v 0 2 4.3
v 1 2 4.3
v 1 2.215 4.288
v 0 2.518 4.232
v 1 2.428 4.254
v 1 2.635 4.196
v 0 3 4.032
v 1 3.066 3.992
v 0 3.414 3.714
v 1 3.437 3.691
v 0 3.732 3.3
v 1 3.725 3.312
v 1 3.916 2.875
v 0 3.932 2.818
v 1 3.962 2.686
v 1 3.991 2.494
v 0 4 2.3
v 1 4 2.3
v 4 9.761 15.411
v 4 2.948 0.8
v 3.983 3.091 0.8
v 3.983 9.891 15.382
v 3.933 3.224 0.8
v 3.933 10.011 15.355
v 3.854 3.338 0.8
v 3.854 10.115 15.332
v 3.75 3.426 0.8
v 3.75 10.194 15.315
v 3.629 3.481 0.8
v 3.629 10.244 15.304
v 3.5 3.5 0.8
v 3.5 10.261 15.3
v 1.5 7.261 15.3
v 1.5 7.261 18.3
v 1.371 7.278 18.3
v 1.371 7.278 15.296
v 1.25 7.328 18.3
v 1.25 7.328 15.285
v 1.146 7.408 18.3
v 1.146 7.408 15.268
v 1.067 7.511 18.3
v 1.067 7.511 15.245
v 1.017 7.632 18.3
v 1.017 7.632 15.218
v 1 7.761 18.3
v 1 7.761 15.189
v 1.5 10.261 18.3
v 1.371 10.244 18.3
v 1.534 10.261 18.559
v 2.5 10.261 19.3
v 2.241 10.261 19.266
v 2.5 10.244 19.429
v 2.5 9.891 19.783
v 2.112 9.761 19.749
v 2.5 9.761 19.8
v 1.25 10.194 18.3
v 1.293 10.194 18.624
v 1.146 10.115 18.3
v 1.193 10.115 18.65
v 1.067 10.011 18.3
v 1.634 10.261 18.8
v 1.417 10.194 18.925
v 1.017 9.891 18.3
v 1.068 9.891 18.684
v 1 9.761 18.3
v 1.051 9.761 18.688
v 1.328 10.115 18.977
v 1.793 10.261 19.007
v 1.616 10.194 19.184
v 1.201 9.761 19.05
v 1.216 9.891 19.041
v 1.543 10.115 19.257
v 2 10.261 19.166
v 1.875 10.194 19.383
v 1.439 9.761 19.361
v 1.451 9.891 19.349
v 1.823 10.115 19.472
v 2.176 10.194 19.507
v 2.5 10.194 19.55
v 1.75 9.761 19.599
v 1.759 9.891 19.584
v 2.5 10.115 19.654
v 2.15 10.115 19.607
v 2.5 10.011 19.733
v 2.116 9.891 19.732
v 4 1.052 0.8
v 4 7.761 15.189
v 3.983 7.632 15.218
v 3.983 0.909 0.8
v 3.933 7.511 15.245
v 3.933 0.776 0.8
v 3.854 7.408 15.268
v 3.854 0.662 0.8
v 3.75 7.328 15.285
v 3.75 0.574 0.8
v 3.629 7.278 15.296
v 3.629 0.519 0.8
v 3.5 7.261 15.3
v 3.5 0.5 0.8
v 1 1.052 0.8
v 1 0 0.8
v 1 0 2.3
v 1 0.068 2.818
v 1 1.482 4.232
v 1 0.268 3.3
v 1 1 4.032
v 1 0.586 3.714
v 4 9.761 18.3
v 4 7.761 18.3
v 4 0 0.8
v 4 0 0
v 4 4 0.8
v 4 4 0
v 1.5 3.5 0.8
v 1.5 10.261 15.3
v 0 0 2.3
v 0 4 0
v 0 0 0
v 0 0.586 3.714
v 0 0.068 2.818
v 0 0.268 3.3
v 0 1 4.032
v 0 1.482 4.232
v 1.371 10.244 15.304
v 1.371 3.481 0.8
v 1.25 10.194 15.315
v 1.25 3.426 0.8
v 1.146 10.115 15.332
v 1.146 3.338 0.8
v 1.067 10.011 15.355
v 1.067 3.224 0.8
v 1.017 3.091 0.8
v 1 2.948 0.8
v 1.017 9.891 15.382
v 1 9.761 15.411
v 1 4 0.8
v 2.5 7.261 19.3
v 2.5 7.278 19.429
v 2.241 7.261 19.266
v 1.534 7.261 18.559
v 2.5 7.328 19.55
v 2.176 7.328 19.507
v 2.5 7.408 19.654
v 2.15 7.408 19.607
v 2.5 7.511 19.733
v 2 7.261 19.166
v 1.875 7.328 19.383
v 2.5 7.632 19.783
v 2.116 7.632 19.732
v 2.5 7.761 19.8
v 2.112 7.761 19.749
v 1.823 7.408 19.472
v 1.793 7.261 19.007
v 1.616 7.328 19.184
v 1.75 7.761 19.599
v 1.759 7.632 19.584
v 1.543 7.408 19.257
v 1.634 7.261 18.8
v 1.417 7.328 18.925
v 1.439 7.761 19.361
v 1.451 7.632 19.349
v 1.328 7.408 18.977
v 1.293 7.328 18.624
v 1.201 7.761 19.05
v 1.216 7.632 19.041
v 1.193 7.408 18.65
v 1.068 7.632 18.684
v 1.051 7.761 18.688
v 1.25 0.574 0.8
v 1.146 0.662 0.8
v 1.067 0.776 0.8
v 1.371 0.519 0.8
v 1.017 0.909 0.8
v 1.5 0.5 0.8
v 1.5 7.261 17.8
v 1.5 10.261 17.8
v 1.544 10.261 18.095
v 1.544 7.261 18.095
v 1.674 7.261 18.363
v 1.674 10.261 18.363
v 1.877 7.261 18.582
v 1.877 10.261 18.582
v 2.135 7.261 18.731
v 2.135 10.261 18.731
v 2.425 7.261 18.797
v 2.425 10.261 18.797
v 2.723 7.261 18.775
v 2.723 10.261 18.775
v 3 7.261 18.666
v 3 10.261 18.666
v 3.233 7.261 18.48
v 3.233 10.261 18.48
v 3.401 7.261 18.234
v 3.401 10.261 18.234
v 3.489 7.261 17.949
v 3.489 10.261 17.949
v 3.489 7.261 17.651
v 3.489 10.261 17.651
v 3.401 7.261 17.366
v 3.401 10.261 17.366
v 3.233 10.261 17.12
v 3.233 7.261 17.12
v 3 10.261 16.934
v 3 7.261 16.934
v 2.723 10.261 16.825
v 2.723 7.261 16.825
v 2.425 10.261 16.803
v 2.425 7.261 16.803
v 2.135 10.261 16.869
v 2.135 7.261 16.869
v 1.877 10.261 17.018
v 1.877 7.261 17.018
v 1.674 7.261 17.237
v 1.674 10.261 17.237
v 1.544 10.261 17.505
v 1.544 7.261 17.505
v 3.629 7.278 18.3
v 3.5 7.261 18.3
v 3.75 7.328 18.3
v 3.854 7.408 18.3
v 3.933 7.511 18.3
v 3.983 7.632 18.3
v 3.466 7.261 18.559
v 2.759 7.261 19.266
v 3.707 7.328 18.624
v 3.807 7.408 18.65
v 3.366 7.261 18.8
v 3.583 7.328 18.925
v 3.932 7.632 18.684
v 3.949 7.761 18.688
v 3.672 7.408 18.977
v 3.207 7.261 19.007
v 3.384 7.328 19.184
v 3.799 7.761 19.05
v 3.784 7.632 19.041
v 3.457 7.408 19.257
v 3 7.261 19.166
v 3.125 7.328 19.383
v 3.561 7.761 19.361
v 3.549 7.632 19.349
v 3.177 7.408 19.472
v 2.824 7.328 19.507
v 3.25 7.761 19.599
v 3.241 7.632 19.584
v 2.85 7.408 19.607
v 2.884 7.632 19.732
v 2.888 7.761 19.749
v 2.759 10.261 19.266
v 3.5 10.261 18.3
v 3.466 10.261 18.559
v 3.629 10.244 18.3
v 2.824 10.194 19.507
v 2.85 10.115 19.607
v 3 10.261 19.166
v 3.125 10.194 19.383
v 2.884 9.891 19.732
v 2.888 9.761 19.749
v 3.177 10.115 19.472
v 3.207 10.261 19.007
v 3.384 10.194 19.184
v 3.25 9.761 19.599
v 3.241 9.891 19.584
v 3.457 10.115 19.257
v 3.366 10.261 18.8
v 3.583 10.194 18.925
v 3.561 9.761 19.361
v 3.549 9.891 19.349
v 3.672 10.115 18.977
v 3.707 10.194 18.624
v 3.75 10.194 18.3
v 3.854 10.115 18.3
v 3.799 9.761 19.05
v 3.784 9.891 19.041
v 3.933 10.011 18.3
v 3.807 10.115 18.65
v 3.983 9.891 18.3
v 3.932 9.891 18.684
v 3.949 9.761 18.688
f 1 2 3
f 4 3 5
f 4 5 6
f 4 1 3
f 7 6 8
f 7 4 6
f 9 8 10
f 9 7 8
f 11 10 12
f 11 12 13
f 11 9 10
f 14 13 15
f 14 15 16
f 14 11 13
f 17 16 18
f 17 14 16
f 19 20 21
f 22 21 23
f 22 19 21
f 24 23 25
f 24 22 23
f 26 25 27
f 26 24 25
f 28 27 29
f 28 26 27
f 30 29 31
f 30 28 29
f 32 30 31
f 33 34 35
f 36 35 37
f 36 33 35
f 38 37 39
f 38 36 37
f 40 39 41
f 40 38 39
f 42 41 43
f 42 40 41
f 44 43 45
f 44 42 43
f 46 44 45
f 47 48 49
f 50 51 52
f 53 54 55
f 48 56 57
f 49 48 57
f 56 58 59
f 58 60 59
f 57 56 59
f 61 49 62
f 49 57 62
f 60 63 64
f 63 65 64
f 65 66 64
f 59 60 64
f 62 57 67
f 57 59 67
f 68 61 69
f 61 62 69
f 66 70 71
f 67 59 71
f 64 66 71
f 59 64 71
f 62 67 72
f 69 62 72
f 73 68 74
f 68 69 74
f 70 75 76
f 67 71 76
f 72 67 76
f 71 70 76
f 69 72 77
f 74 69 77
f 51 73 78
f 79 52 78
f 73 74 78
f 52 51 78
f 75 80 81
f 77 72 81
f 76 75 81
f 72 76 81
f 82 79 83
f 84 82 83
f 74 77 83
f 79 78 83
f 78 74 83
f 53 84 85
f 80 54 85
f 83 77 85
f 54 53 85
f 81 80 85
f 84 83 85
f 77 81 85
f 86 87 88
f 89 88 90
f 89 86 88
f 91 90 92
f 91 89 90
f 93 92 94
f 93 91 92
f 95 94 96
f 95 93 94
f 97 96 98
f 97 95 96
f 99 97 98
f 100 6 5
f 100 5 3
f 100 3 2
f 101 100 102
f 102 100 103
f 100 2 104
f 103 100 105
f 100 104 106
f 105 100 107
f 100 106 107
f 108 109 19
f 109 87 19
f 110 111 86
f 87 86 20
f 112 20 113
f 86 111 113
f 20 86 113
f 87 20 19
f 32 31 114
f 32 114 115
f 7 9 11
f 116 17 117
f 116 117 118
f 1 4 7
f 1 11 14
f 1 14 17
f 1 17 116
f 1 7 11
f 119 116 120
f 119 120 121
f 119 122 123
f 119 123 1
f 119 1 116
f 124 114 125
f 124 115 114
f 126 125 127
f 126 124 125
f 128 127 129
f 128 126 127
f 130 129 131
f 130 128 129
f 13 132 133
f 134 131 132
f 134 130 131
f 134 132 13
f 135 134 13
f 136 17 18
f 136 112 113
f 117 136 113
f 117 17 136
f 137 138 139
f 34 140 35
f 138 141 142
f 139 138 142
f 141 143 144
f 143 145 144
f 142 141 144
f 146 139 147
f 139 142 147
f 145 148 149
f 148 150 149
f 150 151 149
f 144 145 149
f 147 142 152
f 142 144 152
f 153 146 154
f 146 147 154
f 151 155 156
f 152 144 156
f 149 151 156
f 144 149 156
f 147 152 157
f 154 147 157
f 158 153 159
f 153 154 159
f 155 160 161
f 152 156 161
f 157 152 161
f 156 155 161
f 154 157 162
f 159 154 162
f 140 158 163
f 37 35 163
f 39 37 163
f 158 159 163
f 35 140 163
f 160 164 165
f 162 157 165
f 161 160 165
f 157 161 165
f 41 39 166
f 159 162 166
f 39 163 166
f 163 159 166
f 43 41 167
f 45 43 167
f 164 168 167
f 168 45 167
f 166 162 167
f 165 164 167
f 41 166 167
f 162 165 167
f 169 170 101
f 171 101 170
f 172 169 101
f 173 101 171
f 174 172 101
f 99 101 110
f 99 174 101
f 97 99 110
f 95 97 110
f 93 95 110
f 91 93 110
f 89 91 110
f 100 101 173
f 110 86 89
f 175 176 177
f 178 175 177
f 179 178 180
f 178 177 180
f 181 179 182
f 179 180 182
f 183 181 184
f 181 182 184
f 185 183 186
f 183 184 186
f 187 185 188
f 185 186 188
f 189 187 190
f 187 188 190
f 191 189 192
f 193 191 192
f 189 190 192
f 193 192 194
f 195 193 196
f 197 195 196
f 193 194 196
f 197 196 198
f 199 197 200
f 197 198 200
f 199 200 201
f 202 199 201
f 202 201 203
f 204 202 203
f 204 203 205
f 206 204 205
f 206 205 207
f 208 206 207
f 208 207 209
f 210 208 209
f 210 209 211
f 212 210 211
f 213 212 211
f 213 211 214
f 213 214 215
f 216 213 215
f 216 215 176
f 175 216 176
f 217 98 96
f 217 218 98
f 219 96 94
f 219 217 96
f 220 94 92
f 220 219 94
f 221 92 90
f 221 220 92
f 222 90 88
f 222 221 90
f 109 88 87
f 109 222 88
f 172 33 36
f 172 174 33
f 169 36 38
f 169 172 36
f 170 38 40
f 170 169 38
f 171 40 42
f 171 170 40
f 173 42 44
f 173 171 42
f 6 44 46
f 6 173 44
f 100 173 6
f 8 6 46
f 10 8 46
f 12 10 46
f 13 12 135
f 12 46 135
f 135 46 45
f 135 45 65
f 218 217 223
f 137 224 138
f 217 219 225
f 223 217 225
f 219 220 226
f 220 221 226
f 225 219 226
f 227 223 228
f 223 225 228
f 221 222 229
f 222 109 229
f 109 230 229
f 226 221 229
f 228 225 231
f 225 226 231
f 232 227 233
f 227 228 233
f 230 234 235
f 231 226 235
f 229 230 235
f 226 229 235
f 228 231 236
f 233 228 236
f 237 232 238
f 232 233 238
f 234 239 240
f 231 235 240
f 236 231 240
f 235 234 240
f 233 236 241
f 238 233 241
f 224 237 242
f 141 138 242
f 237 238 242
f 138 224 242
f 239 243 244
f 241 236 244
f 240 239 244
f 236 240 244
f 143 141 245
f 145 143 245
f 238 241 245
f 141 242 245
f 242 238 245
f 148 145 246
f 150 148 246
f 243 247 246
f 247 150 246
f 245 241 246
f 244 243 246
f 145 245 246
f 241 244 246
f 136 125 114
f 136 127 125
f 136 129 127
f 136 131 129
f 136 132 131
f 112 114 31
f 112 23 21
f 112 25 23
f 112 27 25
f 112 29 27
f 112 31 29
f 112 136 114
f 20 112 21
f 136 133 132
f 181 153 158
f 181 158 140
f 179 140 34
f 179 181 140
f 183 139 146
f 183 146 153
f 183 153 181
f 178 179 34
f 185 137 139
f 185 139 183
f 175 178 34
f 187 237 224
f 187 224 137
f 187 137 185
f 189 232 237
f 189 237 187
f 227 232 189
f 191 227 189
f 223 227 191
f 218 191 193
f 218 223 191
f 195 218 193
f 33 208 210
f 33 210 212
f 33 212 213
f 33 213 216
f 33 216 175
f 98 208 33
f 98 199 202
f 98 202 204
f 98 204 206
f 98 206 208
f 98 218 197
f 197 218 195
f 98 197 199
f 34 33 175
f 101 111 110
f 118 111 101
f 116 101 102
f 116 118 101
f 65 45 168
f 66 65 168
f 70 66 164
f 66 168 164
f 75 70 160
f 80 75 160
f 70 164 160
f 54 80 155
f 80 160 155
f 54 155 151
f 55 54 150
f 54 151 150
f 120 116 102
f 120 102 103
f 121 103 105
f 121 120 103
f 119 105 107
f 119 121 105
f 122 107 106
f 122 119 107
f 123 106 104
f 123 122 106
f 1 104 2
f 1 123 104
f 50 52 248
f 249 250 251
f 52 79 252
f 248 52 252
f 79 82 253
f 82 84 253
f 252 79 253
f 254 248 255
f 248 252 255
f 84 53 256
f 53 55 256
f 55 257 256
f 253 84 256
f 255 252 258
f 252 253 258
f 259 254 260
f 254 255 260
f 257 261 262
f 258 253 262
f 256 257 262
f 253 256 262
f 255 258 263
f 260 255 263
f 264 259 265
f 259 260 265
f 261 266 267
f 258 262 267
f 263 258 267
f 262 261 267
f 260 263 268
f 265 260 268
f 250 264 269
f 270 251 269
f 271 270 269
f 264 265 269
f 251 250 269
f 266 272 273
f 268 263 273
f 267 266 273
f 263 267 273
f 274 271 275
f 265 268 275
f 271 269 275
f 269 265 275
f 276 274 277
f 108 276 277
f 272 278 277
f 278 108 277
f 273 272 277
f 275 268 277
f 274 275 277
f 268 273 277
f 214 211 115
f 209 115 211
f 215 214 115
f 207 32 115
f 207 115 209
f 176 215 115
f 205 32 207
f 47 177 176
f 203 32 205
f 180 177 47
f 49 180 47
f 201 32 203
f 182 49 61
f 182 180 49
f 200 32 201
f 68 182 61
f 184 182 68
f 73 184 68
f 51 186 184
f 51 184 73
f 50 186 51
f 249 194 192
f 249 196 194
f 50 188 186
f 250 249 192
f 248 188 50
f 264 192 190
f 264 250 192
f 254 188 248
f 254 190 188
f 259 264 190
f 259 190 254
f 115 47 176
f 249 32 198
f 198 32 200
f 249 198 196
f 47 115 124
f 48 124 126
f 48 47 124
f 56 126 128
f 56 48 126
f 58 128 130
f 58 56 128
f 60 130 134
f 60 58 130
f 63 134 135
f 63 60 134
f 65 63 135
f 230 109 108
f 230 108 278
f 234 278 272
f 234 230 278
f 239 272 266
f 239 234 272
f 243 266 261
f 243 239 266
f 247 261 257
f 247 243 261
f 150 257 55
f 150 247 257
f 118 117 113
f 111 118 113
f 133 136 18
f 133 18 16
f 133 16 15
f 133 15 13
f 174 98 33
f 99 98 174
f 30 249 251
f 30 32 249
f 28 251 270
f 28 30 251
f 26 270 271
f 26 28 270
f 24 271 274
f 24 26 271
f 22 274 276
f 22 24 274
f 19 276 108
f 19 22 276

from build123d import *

# Parameters (mm, degrees)
F0_W      = 4
F0_H      = 4
F1_DEPTH  = 0.8
F4_DEPTH  = 1.5
F5_R      = 1
F6_DEPTH  = 10.2624610432
F7_R      = 1.49999
F8_R      = 0.49999
F10_DEPTH = 1


# Not quite as in the source:
# - a fillet or chamfer is up to 0.001 mm smaller than in the source, because OpenCascade refuses the exact size


with BuildPart() as f1:
    # F0 (on Top) → F1 (new body)
    with BuildSketch(Plane.XY):
        with Locations((2, 2)):
            Rectangle(F0_W, F0_H)
    extrude(amount=F1_DEPTH)

    # F3 (on offset) → F4 (join, symmetric)
    with BuildSketch(Plane.YZ.offset(2.5)):
        Polygon((0.5, 0.8), (3.5, 0.8), (10.2614610432, 15.3), (10.2614610432, 19.8), (7.2614610432, 19.8), (7.2614610432, 15.3), align=None)
    extrude(amount=F4_DEPTH, both=True)

    # F5 (on face) → F6 (cut, through all)
    with BuildSketch(Plane(origin=(0, 10.2614610432, 0), x_dir=(-1, 0, 0), z_dir=(0, 1, 0))):
        with Locations((-2.5, 17.8)):
            Circle(F5_R)
    extrude(amount=-F6_DEPTH, mode=Mode.SUBTRACT)

    # F7 (radius 1.5 in the source; OpenCascade refuses exactly that, so slightly less here)
    f7_edges = [f1.edges().sort_by_distance(p)[0] for p in [
        (1, 8.761461, 19.8),
        (4, 8.761461, 19.8),
    ]]
    fillet(f7_edges, radius=F7_R)

    # F8 (radius 0.5 in the source; OpenCascade refuses exactly that, so slightly less here)
    f8_edges = [f1.edges().sort_by_distance(p)[0] for p in [
        (1, 6.880731, 8.05),
        (1, 10.261461, 16.800005),
        (3.560663, 10.261461, 19.360663),
        (4, 6.880731, 8.05),
        (1, 3.880731, 8.05),
        (1, 7.261461, 16.800005),
        (4, 3.880731, 8.05),
    ]]
    fillet(f8_edges, radius=F8_R)

    # F9 (on face) → F10 (join)
    with BuildSketch(Plane(origin=(0, 0, 0), x_dir=(0, -1, 0), z_dir=(-1, 0, 0))):
        with BuildLine():
            Line((-4, 2.3), (-4, 0.8))
            Line((-4, 0.8), (0, 0.8))
            Line((0, 0.8), (0, 2.3))
            ThreePointArc((0, 2.3), (-0.5857864376, 3.7142135624), (-2, 4.3))
            ThreePointArc((-2, 4.3), (-3.4142135624, 3.7142135624), (-4, 2.3))
        make_face()
    extrude(amount=-F10_DEPTH)


solid = f1.part
